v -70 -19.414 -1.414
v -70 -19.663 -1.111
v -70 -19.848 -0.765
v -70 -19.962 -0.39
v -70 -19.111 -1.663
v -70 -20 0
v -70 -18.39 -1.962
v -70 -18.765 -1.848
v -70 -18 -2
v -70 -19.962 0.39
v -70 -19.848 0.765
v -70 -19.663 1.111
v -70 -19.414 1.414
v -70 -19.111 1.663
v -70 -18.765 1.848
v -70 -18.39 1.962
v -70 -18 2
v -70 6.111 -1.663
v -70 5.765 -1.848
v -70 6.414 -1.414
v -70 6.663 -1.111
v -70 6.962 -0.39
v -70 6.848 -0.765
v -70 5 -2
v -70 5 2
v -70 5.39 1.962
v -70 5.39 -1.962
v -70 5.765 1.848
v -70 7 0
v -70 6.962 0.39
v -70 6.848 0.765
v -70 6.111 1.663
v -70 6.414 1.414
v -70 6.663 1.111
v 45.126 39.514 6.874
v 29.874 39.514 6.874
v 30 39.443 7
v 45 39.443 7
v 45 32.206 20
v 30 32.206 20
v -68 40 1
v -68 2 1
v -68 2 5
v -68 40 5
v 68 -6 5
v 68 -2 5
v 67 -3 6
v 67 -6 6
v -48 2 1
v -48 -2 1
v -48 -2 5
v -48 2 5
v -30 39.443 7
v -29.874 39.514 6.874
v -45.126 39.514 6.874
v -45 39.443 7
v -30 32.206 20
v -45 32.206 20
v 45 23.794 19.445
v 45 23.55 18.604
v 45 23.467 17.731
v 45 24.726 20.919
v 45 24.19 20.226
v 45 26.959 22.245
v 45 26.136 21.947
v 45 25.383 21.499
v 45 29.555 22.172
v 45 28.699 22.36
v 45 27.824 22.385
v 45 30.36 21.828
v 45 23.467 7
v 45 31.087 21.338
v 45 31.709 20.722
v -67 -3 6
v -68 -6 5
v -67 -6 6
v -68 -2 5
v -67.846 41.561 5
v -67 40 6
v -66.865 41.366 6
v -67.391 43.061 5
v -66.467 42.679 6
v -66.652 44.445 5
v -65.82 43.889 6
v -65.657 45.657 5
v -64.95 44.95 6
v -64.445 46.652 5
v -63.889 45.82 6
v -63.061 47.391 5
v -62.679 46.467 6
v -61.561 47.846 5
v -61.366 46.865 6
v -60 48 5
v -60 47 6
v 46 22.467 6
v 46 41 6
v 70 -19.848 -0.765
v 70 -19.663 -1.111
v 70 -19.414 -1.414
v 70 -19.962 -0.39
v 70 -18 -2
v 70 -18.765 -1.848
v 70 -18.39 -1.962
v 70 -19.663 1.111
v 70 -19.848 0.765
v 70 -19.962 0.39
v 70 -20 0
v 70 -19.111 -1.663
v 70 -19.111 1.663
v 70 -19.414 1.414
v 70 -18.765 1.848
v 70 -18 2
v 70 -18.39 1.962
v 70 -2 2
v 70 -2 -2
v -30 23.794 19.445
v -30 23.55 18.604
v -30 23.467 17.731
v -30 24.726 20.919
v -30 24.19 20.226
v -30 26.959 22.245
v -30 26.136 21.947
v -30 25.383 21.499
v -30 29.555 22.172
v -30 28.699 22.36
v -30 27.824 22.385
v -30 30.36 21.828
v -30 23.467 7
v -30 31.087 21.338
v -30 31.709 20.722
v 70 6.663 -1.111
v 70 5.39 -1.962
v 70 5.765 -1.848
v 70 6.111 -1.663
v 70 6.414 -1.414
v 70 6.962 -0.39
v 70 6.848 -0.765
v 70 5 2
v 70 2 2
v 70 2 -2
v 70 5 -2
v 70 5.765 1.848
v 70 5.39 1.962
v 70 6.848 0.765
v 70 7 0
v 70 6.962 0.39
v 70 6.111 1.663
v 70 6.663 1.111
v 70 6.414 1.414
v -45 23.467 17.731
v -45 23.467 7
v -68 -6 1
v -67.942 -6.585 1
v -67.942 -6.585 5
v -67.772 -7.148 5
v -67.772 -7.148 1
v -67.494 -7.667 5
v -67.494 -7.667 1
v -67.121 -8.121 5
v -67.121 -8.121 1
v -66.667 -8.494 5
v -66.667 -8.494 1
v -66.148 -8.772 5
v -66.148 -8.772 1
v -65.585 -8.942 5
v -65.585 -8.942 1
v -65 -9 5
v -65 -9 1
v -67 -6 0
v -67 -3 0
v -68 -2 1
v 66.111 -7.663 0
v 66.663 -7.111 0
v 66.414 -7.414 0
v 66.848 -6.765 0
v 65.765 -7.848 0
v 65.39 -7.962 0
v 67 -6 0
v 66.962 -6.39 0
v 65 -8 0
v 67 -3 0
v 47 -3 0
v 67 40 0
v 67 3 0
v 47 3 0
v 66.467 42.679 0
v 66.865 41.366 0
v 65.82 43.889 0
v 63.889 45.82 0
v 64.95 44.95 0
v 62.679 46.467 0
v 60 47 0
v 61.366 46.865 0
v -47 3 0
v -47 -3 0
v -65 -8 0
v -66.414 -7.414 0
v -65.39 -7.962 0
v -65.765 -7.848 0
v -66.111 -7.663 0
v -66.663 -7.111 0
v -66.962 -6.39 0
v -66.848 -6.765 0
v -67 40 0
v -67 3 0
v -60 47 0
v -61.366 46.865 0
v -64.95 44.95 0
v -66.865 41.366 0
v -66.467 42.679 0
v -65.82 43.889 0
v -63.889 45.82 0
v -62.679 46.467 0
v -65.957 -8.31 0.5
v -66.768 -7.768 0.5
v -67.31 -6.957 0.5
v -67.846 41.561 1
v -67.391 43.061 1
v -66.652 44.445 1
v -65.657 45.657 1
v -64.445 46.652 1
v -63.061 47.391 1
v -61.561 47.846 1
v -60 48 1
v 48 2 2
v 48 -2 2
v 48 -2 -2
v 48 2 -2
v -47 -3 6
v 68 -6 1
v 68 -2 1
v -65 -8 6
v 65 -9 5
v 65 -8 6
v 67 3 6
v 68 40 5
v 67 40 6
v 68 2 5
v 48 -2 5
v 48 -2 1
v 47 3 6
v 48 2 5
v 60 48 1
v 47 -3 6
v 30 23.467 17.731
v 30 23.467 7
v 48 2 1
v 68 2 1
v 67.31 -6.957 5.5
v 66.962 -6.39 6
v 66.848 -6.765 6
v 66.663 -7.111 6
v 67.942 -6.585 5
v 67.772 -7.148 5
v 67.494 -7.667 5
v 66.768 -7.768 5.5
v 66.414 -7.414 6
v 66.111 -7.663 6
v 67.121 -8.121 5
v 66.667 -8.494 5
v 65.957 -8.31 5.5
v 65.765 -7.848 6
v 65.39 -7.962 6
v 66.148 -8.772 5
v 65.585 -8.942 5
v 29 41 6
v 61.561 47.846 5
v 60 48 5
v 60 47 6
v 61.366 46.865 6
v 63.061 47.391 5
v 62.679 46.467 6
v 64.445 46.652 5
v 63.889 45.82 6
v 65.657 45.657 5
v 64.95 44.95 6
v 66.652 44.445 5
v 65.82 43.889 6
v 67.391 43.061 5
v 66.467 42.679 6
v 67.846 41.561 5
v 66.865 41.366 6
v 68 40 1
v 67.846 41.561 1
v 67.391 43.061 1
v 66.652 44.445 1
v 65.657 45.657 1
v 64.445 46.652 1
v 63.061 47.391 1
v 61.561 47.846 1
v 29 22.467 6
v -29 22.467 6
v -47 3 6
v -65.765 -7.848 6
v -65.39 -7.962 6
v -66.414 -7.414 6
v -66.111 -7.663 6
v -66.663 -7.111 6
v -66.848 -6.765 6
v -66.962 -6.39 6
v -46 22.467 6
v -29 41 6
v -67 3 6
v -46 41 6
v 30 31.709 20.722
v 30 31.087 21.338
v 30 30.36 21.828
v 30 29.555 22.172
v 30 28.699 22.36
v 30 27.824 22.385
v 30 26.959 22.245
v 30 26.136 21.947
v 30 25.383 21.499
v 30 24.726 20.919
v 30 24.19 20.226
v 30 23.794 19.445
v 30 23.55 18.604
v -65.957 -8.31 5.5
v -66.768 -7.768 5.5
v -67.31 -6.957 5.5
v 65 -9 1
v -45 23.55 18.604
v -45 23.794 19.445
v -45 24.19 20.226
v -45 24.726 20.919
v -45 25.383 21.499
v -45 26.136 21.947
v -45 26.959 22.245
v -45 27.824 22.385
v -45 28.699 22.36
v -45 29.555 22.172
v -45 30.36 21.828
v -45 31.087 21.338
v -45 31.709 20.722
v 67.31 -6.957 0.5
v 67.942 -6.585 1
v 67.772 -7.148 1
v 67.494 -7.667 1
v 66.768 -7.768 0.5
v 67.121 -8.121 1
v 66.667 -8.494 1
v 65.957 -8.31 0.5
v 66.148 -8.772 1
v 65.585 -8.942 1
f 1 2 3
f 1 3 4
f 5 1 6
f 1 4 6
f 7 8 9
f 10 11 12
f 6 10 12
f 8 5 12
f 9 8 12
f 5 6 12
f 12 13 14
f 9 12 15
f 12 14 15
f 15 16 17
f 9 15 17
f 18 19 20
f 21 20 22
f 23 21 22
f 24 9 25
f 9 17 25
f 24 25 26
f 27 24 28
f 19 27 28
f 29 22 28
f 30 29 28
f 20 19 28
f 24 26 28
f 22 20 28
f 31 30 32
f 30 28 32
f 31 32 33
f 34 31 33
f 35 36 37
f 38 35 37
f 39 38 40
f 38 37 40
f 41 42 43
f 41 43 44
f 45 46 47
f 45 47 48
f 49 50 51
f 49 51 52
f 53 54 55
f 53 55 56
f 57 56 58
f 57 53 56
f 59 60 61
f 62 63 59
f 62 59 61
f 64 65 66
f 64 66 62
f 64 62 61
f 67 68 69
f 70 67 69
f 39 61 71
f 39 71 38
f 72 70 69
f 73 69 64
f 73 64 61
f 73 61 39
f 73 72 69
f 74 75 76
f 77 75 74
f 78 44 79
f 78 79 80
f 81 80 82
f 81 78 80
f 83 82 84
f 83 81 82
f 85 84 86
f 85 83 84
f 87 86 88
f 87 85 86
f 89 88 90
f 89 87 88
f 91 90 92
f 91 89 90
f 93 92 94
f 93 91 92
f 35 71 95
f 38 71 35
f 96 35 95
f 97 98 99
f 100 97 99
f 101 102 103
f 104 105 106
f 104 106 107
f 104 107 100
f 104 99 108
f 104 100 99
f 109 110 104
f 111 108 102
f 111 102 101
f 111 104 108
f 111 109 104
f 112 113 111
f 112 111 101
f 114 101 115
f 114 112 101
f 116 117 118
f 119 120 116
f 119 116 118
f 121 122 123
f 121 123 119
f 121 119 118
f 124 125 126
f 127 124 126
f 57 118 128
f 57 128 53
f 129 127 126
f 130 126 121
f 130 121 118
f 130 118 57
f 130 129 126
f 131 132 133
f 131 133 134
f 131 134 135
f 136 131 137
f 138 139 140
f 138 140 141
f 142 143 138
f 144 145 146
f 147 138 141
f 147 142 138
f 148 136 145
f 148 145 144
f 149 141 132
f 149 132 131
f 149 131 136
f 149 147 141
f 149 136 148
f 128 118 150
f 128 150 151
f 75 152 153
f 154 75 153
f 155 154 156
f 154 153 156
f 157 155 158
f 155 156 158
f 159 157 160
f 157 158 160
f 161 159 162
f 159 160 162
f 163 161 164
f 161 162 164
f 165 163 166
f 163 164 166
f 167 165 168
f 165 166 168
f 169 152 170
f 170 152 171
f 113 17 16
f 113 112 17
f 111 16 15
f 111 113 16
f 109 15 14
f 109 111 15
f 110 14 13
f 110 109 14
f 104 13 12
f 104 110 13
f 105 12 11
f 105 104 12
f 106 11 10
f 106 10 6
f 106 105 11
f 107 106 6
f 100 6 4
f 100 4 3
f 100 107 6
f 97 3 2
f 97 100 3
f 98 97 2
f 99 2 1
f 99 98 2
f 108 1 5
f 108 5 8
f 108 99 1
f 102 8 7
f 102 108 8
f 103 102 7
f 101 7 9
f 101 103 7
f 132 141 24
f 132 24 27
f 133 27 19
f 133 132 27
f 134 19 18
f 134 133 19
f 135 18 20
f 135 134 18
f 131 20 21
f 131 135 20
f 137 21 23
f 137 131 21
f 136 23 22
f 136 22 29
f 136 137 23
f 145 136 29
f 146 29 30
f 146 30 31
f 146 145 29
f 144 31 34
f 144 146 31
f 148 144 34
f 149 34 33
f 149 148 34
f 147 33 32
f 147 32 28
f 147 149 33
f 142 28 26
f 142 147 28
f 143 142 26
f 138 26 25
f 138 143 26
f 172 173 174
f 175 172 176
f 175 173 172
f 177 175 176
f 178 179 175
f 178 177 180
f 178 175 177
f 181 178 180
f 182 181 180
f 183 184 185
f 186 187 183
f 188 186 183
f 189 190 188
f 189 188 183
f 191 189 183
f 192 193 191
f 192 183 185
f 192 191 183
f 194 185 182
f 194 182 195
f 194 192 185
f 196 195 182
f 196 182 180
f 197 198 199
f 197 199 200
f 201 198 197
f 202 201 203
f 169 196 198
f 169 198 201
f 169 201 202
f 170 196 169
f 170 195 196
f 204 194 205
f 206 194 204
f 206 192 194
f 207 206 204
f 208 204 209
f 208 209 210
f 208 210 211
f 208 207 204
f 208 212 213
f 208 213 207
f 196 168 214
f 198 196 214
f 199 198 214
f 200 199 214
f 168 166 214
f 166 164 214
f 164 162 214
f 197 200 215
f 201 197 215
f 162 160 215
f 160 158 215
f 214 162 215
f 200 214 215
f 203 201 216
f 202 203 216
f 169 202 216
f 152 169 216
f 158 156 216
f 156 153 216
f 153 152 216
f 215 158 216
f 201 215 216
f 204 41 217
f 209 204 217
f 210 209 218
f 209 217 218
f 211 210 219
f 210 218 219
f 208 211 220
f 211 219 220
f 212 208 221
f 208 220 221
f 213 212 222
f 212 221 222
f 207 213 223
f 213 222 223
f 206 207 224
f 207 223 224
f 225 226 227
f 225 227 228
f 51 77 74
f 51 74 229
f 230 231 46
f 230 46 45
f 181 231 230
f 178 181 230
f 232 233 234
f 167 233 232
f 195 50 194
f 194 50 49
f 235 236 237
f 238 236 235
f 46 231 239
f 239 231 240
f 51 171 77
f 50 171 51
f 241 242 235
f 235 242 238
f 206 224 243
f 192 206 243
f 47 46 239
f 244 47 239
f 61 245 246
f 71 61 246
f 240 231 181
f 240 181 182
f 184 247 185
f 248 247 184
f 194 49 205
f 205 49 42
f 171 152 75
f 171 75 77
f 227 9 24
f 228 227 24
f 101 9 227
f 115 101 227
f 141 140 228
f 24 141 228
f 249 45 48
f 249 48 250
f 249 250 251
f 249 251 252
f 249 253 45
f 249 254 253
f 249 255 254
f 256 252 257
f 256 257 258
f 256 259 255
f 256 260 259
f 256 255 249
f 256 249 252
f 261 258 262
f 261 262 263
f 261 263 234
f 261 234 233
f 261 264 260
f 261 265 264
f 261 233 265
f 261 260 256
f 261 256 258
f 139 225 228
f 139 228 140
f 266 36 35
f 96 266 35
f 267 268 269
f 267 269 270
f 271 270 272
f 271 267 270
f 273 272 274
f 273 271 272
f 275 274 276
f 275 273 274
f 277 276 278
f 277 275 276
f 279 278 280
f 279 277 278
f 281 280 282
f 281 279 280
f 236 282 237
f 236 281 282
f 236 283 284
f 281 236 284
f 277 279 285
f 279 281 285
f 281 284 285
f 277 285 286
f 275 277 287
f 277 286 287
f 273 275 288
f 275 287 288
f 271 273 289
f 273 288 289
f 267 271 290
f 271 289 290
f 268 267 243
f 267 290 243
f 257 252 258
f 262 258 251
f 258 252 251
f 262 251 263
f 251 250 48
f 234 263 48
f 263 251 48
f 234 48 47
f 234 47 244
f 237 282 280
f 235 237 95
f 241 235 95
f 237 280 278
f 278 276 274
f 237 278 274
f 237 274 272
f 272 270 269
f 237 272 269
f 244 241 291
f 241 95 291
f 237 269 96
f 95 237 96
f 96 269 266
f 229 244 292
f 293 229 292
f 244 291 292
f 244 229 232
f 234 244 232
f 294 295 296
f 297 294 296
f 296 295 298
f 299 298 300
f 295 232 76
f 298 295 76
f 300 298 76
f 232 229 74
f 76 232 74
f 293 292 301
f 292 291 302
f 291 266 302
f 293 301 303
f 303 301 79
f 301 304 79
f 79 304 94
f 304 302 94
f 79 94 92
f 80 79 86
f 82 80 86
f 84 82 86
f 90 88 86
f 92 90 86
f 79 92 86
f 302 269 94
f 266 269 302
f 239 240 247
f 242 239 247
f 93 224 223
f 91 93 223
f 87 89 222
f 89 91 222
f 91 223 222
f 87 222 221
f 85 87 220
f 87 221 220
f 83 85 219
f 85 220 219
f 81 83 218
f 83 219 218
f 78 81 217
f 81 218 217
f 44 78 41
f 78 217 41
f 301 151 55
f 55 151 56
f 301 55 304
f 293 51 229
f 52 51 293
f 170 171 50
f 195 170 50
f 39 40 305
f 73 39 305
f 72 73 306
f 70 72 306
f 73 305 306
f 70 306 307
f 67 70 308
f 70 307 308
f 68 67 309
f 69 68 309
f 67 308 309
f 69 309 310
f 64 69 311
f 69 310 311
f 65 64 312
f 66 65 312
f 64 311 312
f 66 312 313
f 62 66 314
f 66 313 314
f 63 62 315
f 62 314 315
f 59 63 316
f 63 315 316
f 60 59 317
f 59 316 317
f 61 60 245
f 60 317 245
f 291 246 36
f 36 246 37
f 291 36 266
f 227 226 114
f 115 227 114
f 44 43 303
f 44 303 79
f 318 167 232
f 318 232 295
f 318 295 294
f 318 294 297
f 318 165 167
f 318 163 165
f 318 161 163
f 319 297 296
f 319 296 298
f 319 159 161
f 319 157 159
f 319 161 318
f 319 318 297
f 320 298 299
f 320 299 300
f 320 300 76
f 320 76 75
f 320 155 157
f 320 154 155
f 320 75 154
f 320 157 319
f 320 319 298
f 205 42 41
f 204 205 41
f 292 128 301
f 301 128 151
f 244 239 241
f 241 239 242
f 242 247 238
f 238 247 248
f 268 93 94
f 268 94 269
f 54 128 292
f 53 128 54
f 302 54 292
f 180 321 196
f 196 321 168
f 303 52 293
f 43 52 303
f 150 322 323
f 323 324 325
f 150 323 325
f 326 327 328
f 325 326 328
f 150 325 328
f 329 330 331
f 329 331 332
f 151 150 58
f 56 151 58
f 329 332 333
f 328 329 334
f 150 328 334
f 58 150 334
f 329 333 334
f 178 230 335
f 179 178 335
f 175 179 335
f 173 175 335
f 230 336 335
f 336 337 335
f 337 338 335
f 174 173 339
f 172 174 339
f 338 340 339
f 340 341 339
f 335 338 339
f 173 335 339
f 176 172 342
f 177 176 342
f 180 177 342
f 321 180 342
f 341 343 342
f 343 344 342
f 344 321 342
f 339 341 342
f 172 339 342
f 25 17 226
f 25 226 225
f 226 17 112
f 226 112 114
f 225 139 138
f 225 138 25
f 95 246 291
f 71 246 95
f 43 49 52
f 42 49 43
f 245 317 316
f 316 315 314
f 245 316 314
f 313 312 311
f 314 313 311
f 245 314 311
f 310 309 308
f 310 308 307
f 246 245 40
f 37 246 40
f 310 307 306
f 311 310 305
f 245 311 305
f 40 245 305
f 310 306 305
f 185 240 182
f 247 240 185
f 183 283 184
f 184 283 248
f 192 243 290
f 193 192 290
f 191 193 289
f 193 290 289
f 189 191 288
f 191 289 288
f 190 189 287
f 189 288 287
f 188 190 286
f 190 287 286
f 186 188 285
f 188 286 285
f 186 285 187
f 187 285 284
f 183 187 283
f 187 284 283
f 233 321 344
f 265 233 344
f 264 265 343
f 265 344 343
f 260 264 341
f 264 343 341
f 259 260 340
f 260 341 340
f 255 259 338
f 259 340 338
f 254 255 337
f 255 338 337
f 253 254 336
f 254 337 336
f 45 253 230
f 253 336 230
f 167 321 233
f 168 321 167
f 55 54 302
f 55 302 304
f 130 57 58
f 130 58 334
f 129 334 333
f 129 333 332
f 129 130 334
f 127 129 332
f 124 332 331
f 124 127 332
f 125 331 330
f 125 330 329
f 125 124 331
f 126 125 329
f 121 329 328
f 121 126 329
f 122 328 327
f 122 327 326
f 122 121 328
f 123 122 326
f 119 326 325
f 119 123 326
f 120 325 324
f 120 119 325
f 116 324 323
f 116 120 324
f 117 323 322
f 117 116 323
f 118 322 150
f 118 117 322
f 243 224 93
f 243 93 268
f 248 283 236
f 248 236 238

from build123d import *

# Parameters (mm, degrees)
PAD_DEPTH    = 70
SKETCH001_W  = 22
SKETCH001_H  = 4
POCKET_DEPTH = 4
PAD001_DEPTH = 6
PAD002_DEPTH = 15
CHAMFER_SIZE = 1


with BuildPart() as body:
    # Sketch → Pad (new body, symmetric)
    with BuildSketch(Plane.YZ):
        with BuildLine():
            ThreePointArc((-18, 2), (-20, 0), (-18, -2))
            Line((-18, -2), (5, -2))
            ThreePointArc((5, -2), (7, 0), (5, 2))
            Line((-18, 2), (5, 2))
        make_face()
    extrude(amount=PAD_DEPTH, both=True)

    # Sketch001 → Pocket (cut, symmetric)
    with BuildSketch(Plane.XY):
        with Locations((59, 0)):
            Rectangle(SKETCH001_W, SKETCH001_H)
    extrude(amount=POCKET_DEPTH, both=True, mode=Mode.SUBTRACT)


with BuildPart() as body001:
    # Sketch002 → Pad001 (new body)
    with BuildSketch(Plane.XY):
        with BuildLine():
            Line((-60, 48), (60, 48))
            ThreePointArc((68, 40), (65.656854, 45.656854), (60, 48))
            Line((68, 40), (68, 2))
            Line((48, 2), (68, 2))
            Line((48, -2), (48, 2))
            Line((68, -2), (48, -2))
            Line((68, -2), (68, -6))
            ThreePointArc((65, -9), (67.12132, -8.12132), (68, -6))
            Line((65, -9), (-65, -9))
            ThreePointArc((-68, -6), (-67.12132, -8.12132), (-65, -9))
            Line((-68, -6), (-68, -2))
            Line((-68, -2), (-48, -2))
            Line((-48, -2), (-48, 2))
            Line((-48, 2), (-68, 2))
            Line((-68, 2), (-68, 40))
            ThreePointArc((-60, 48), (-65.656854, 45.656854), (-68, 40))
        make_face()
    extrude(amount=PAD001_DEPTH)

    # Sketch003 → Pad002 (join)
    with BuildSketch(Plane.YZ.offset(30)):
        with BuildLine():
            ThreePointArc((32.20551, 20), (26.959044, 22.245373), (23.467371, 17.731469))
            Line((23.467371, 17.731469), (23.467371, 6))
            Line((23.467371, 6), (40, 6))
            Line((40, 6), (32.20551, 20))
        make_face()
    pad002 = extrude(amount=PAD002_DEPTH)

    # Mirrored: Pad002 across YZ
    add(pad002.mirror(Plane.YZ))

    # Chamfer
    chamfer_edges = [body001.edges().sort_by_distance(p)[0] for p in [
        (-68, -4, 6),
        (-67.12132, -8.12132, 6),
        (-58, -2, 6),
        (0, -9, 6),
        (-48, 0, 6),
        (67.12132, -8.12132, 6),
        (-58, 2, 6),
        (68, -4, 6),
        (-68, 21, 6),
        (58, -2, 6),
        (-65.656854, 45.656854, 6),
        (48, 0, 6),
        (0, 48, 6),
        (58, 2, 6),
        (65.656854, 45.656854, 6),
        (68, 21, 6),
        (37.5, 23.467371, 6),
        (30, 31.733686, 6),
        (45, 31.733686, 6),
        (37.5, 40, 6),
        (-30, 31.733686, 6),
        (-37.5, 40, 6),
        (-45, 31.733686, 6),
        (-37.5, 23.467371, 6),
        (-68, -4, 0),
        (-58, -2, 0),
        (-48, 0, 0),
        (-58, 2, 0),
        (-68, 21, 0),
        (-65.656854, 45.656854, 0),
        (0, 48, 0),
        (65.656854, 45.656854, 0),
        (68, 21, 0),
        (58, 2, 0),
        (48, 0, 0),
        (58, -2, 0),
        (68, -4, 0),
        (67.12132, -8.12132, 0),
        (0, -9, 0),
        (-67.12132, -8.12132, 0),
    ]]
    chamfer(chamfer_edges, length=CHAMFER_SIZE)


solid = Compound([body.part, body001.part])
